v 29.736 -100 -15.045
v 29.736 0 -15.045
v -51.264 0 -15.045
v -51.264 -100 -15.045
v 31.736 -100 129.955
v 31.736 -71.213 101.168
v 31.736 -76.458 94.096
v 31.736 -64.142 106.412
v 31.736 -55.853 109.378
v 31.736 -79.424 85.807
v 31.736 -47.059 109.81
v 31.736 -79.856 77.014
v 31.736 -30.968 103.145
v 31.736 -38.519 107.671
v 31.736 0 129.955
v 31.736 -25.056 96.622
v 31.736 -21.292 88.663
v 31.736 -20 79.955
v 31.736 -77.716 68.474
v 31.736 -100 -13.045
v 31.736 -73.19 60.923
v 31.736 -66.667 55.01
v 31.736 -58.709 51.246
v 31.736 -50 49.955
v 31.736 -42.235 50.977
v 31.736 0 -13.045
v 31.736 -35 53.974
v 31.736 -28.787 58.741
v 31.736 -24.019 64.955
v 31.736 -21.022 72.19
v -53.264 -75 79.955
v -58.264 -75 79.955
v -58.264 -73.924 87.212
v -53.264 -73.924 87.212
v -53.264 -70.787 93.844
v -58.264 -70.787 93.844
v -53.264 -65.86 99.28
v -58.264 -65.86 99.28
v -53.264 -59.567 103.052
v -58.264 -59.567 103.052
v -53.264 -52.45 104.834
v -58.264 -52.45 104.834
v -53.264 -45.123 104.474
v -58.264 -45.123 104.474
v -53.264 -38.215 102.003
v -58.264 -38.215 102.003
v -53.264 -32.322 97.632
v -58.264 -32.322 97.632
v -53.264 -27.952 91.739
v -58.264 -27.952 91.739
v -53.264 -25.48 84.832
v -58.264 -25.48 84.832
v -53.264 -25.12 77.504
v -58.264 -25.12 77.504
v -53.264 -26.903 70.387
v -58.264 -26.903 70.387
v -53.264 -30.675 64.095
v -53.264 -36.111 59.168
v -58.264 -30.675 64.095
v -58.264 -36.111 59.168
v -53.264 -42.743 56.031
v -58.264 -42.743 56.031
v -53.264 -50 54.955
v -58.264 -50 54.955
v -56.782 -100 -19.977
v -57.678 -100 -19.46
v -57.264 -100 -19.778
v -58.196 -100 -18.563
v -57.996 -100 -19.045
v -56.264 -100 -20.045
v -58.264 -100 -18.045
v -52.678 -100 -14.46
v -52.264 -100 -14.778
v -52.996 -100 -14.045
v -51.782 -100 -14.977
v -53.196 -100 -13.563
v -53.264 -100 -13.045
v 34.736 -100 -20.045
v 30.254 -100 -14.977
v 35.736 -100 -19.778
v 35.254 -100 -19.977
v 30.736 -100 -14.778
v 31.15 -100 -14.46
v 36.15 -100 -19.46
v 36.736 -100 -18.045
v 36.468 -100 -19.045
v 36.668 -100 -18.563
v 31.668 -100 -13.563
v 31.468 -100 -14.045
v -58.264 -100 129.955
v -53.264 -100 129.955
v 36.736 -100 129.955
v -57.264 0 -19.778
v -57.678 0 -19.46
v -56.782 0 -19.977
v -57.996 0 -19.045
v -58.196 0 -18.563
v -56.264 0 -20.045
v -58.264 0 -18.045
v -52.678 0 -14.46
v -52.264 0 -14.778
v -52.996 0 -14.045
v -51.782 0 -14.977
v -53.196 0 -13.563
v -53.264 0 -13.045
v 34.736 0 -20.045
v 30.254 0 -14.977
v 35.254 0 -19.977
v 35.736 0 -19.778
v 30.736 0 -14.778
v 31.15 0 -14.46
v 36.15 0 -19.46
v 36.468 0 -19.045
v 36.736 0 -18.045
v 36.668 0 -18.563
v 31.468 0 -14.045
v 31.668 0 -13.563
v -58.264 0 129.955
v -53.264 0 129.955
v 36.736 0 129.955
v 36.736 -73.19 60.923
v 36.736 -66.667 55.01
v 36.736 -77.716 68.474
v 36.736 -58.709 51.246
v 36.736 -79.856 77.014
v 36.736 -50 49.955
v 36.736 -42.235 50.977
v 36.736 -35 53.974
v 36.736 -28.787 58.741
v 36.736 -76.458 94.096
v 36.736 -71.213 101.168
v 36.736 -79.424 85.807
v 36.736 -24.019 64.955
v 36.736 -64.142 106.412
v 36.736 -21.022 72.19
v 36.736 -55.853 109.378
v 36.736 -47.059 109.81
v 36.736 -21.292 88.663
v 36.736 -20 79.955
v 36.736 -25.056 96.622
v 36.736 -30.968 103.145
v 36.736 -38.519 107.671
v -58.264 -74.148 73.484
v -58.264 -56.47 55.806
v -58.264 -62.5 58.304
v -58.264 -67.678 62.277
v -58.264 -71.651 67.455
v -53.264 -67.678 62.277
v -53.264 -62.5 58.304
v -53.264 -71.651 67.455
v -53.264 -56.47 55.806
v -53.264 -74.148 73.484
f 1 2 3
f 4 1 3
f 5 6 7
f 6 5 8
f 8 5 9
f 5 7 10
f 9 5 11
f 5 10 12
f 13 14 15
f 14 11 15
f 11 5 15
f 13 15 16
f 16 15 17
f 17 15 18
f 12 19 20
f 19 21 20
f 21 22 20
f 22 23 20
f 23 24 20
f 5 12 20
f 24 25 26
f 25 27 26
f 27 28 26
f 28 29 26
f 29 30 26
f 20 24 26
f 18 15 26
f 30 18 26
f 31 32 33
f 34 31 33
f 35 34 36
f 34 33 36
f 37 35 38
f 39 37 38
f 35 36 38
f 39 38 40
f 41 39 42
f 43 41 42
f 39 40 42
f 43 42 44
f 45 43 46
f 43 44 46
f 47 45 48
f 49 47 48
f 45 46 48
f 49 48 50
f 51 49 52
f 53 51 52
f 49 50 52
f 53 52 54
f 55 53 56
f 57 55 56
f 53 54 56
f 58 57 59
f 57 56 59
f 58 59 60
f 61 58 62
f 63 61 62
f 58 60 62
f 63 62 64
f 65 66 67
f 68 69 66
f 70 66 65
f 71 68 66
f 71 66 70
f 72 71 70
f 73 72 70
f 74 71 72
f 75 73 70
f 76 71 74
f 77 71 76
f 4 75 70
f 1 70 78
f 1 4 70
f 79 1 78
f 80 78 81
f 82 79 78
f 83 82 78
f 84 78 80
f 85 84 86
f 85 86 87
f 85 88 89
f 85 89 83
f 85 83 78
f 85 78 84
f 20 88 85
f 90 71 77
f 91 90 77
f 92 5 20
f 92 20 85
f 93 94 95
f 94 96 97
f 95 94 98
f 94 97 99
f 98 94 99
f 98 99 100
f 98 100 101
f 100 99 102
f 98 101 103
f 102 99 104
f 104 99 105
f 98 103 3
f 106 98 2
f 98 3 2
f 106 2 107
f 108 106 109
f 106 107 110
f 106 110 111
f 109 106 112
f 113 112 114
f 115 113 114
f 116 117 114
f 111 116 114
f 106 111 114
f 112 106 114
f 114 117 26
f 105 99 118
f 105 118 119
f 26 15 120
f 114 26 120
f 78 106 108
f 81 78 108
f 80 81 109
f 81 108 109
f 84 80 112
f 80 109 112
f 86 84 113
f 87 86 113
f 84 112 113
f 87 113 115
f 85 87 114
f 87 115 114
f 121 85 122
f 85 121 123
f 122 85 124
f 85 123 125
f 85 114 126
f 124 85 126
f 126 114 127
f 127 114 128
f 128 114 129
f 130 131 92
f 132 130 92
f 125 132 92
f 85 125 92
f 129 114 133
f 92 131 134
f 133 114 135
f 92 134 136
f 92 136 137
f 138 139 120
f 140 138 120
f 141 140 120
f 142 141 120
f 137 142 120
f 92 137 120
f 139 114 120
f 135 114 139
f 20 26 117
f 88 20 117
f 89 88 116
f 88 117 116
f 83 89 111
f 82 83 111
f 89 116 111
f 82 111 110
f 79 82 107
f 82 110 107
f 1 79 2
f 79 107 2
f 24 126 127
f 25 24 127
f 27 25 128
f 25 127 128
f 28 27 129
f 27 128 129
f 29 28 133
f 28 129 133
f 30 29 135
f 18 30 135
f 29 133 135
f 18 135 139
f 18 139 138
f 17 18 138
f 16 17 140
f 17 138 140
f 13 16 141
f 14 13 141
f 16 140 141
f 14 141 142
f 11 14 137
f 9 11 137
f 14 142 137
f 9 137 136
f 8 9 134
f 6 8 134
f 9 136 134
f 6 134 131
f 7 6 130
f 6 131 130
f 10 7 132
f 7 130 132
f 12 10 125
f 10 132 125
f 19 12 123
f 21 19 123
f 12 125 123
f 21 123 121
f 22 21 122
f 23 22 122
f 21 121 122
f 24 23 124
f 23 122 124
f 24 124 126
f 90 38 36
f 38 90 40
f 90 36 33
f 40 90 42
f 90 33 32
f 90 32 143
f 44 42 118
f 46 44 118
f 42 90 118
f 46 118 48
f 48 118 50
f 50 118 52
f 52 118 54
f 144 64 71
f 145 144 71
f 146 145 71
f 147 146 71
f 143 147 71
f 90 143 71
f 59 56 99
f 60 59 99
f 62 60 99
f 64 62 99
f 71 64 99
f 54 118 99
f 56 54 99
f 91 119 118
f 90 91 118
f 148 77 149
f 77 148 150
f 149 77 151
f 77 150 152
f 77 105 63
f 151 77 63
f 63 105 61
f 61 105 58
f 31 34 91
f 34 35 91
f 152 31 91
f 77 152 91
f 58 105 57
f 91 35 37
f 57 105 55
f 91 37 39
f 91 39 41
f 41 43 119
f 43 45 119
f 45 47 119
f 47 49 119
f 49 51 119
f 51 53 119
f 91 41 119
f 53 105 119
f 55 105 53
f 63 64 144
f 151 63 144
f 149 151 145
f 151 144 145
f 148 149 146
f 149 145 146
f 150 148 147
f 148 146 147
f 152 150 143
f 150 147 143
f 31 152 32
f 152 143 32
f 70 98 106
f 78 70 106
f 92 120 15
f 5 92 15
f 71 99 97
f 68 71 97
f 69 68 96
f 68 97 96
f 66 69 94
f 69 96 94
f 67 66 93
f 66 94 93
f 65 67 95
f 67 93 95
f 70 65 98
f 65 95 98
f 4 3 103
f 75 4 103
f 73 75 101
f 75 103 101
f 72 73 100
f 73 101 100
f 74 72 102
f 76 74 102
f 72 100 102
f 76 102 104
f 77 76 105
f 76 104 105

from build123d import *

# Parameters (mm, degrees)
F1_DEPTH = 100
F3_DEPTH = 5
F5_DEPTH = 5


with BuildPart() as f1:
    # F0 (on Front) → F1 (new body)
    with BuildSketch(Plane.XZ):
        with BuildLine():
            Line((-53.263988, 129.954544), (-58.263987, 129.954544))
            Line((-58.263987, 129.954544), (-58.263987, -18.045456))
            ThreePointArc((-58.263987, -18.045456), (-57.678201, -19.459669), (-56.263987, -20.045456))
            Line((-56.263987, -20.045456), (34.736013, -20.045456))
            ThreePointArc((34.736013, -20.045456), (36.150226, -19.459669), (36.736013, -18.045456))
            Line((36.736013, -18.045456), (36.736013, 129.954544))
            Line((36.736013, 129.954544), (31.736013, 129.954544))
            Line((31.736013, 129.954544), (31.736013, -13.045456))
            ThreePointArc((31.736013, -13.045456), (31.150226, -14.459669), (29.736013, -15.045456))
            Line((29.736013, -15.045456), (-51.263988, -15.045456))
            ThreePointArc((-51.263988, -15.045456), (-52.678202, -14.459669), (-53.263988, -13.045456))
            Line((-53.263988, -13.045456), (-53.263988, 129.954544))
        make_face()
    extrude(amount=F1_DEPTH)

    # F2 (on face) → F3 (cut)
    with BuildSketch(Plane.YZ.offset(36.736013)):
        with BuildLine():
            ThreePointArc((-20, 79.954544), (-71.213203, 101.167748), (-50, 49.954544))
            ThreePointArc((-50, 49.954544), (-28.786797, 58.741341), (-20, 79.954544))
        make_face()
    extrude(amount=-F3_DEPTH, mode=Mode.SUBTRACT)

    # F4 (on face) → F5 (cut)
    with BuildSketch(Plane(origin=(-58.263987, 0, 0), x_dir=(0, -1, 0), z_dir=(-1, 0, 0))):
        with BuildLine():
            ThreePointArc((75, 79.954544), (32.32233, 97.632214), (50, 54.954544))
            ThreePointArc((50, 54.954544), (67.67767, 62.276875), (75, 79.954544))
        make_face()
    extrude(amount=-F5_DEPTH, mode=Mode.SUBTRACT)


solid = f1.part
